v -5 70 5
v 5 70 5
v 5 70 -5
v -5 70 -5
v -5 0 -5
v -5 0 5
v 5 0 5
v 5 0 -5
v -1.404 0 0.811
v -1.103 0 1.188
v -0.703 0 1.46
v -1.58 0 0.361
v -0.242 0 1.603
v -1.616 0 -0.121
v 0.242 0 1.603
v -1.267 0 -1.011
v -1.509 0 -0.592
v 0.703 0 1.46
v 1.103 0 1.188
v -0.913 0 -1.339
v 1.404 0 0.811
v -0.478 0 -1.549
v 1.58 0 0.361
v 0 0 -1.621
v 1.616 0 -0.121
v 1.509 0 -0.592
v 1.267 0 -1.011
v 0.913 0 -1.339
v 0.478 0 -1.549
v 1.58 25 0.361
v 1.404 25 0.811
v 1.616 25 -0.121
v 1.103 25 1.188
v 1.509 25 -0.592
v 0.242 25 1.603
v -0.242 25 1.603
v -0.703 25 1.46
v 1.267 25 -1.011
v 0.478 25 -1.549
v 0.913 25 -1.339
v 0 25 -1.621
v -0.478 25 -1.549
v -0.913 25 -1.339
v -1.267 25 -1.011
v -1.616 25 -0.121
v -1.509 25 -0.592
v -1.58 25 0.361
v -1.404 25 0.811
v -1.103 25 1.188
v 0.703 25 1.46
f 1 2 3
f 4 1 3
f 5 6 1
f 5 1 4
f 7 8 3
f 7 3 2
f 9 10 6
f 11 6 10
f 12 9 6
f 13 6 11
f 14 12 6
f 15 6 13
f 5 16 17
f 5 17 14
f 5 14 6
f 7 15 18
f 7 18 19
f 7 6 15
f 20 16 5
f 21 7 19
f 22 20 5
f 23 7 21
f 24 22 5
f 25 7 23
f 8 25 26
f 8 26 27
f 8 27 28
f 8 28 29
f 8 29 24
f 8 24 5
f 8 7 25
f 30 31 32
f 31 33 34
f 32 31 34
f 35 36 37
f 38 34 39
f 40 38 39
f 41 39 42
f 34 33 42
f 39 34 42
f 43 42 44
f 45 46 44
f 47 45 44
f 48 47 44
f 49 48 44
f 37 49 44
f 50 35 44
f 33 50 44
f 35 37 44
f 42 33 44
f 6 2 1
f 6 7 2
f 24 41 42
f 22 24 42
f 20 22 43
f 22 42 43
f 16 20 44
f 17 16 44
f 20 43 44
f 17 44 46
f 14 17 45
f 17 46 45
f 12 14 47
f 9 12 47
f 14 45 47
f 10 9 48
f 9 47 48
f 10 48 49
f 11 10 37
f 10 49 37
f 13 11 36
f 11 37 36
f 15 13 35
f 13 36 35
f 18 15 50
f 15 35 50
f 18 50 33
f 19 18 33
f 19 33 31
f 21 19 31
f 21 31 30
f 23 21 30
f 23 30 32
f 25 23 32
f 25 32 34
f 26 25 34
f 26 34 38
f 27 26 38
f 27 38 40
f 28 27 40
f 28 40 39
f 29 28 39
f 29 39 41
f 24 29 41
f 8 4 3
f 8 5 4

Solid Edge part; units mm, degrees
sketch "Sketch1" plane through (0, 0, 0) normal (0, -1, 0) x (1, 0, 0)
  line L0 (5, 5) -> (-5, 5)
  line L1 (-5, 5) -> (-5, -5)
  line L2 (-5, -5) -> (5, -5)
  line L3 (5, -5) -> (5, 5)
extrude "Protrusion1" add sketch "Sketch1" against normal blind 70
hole "Hole_1" at (0, 0, 0) direction (0, 1, 0) diameter 3.242 depth 25 thread major 4 thread length 2
